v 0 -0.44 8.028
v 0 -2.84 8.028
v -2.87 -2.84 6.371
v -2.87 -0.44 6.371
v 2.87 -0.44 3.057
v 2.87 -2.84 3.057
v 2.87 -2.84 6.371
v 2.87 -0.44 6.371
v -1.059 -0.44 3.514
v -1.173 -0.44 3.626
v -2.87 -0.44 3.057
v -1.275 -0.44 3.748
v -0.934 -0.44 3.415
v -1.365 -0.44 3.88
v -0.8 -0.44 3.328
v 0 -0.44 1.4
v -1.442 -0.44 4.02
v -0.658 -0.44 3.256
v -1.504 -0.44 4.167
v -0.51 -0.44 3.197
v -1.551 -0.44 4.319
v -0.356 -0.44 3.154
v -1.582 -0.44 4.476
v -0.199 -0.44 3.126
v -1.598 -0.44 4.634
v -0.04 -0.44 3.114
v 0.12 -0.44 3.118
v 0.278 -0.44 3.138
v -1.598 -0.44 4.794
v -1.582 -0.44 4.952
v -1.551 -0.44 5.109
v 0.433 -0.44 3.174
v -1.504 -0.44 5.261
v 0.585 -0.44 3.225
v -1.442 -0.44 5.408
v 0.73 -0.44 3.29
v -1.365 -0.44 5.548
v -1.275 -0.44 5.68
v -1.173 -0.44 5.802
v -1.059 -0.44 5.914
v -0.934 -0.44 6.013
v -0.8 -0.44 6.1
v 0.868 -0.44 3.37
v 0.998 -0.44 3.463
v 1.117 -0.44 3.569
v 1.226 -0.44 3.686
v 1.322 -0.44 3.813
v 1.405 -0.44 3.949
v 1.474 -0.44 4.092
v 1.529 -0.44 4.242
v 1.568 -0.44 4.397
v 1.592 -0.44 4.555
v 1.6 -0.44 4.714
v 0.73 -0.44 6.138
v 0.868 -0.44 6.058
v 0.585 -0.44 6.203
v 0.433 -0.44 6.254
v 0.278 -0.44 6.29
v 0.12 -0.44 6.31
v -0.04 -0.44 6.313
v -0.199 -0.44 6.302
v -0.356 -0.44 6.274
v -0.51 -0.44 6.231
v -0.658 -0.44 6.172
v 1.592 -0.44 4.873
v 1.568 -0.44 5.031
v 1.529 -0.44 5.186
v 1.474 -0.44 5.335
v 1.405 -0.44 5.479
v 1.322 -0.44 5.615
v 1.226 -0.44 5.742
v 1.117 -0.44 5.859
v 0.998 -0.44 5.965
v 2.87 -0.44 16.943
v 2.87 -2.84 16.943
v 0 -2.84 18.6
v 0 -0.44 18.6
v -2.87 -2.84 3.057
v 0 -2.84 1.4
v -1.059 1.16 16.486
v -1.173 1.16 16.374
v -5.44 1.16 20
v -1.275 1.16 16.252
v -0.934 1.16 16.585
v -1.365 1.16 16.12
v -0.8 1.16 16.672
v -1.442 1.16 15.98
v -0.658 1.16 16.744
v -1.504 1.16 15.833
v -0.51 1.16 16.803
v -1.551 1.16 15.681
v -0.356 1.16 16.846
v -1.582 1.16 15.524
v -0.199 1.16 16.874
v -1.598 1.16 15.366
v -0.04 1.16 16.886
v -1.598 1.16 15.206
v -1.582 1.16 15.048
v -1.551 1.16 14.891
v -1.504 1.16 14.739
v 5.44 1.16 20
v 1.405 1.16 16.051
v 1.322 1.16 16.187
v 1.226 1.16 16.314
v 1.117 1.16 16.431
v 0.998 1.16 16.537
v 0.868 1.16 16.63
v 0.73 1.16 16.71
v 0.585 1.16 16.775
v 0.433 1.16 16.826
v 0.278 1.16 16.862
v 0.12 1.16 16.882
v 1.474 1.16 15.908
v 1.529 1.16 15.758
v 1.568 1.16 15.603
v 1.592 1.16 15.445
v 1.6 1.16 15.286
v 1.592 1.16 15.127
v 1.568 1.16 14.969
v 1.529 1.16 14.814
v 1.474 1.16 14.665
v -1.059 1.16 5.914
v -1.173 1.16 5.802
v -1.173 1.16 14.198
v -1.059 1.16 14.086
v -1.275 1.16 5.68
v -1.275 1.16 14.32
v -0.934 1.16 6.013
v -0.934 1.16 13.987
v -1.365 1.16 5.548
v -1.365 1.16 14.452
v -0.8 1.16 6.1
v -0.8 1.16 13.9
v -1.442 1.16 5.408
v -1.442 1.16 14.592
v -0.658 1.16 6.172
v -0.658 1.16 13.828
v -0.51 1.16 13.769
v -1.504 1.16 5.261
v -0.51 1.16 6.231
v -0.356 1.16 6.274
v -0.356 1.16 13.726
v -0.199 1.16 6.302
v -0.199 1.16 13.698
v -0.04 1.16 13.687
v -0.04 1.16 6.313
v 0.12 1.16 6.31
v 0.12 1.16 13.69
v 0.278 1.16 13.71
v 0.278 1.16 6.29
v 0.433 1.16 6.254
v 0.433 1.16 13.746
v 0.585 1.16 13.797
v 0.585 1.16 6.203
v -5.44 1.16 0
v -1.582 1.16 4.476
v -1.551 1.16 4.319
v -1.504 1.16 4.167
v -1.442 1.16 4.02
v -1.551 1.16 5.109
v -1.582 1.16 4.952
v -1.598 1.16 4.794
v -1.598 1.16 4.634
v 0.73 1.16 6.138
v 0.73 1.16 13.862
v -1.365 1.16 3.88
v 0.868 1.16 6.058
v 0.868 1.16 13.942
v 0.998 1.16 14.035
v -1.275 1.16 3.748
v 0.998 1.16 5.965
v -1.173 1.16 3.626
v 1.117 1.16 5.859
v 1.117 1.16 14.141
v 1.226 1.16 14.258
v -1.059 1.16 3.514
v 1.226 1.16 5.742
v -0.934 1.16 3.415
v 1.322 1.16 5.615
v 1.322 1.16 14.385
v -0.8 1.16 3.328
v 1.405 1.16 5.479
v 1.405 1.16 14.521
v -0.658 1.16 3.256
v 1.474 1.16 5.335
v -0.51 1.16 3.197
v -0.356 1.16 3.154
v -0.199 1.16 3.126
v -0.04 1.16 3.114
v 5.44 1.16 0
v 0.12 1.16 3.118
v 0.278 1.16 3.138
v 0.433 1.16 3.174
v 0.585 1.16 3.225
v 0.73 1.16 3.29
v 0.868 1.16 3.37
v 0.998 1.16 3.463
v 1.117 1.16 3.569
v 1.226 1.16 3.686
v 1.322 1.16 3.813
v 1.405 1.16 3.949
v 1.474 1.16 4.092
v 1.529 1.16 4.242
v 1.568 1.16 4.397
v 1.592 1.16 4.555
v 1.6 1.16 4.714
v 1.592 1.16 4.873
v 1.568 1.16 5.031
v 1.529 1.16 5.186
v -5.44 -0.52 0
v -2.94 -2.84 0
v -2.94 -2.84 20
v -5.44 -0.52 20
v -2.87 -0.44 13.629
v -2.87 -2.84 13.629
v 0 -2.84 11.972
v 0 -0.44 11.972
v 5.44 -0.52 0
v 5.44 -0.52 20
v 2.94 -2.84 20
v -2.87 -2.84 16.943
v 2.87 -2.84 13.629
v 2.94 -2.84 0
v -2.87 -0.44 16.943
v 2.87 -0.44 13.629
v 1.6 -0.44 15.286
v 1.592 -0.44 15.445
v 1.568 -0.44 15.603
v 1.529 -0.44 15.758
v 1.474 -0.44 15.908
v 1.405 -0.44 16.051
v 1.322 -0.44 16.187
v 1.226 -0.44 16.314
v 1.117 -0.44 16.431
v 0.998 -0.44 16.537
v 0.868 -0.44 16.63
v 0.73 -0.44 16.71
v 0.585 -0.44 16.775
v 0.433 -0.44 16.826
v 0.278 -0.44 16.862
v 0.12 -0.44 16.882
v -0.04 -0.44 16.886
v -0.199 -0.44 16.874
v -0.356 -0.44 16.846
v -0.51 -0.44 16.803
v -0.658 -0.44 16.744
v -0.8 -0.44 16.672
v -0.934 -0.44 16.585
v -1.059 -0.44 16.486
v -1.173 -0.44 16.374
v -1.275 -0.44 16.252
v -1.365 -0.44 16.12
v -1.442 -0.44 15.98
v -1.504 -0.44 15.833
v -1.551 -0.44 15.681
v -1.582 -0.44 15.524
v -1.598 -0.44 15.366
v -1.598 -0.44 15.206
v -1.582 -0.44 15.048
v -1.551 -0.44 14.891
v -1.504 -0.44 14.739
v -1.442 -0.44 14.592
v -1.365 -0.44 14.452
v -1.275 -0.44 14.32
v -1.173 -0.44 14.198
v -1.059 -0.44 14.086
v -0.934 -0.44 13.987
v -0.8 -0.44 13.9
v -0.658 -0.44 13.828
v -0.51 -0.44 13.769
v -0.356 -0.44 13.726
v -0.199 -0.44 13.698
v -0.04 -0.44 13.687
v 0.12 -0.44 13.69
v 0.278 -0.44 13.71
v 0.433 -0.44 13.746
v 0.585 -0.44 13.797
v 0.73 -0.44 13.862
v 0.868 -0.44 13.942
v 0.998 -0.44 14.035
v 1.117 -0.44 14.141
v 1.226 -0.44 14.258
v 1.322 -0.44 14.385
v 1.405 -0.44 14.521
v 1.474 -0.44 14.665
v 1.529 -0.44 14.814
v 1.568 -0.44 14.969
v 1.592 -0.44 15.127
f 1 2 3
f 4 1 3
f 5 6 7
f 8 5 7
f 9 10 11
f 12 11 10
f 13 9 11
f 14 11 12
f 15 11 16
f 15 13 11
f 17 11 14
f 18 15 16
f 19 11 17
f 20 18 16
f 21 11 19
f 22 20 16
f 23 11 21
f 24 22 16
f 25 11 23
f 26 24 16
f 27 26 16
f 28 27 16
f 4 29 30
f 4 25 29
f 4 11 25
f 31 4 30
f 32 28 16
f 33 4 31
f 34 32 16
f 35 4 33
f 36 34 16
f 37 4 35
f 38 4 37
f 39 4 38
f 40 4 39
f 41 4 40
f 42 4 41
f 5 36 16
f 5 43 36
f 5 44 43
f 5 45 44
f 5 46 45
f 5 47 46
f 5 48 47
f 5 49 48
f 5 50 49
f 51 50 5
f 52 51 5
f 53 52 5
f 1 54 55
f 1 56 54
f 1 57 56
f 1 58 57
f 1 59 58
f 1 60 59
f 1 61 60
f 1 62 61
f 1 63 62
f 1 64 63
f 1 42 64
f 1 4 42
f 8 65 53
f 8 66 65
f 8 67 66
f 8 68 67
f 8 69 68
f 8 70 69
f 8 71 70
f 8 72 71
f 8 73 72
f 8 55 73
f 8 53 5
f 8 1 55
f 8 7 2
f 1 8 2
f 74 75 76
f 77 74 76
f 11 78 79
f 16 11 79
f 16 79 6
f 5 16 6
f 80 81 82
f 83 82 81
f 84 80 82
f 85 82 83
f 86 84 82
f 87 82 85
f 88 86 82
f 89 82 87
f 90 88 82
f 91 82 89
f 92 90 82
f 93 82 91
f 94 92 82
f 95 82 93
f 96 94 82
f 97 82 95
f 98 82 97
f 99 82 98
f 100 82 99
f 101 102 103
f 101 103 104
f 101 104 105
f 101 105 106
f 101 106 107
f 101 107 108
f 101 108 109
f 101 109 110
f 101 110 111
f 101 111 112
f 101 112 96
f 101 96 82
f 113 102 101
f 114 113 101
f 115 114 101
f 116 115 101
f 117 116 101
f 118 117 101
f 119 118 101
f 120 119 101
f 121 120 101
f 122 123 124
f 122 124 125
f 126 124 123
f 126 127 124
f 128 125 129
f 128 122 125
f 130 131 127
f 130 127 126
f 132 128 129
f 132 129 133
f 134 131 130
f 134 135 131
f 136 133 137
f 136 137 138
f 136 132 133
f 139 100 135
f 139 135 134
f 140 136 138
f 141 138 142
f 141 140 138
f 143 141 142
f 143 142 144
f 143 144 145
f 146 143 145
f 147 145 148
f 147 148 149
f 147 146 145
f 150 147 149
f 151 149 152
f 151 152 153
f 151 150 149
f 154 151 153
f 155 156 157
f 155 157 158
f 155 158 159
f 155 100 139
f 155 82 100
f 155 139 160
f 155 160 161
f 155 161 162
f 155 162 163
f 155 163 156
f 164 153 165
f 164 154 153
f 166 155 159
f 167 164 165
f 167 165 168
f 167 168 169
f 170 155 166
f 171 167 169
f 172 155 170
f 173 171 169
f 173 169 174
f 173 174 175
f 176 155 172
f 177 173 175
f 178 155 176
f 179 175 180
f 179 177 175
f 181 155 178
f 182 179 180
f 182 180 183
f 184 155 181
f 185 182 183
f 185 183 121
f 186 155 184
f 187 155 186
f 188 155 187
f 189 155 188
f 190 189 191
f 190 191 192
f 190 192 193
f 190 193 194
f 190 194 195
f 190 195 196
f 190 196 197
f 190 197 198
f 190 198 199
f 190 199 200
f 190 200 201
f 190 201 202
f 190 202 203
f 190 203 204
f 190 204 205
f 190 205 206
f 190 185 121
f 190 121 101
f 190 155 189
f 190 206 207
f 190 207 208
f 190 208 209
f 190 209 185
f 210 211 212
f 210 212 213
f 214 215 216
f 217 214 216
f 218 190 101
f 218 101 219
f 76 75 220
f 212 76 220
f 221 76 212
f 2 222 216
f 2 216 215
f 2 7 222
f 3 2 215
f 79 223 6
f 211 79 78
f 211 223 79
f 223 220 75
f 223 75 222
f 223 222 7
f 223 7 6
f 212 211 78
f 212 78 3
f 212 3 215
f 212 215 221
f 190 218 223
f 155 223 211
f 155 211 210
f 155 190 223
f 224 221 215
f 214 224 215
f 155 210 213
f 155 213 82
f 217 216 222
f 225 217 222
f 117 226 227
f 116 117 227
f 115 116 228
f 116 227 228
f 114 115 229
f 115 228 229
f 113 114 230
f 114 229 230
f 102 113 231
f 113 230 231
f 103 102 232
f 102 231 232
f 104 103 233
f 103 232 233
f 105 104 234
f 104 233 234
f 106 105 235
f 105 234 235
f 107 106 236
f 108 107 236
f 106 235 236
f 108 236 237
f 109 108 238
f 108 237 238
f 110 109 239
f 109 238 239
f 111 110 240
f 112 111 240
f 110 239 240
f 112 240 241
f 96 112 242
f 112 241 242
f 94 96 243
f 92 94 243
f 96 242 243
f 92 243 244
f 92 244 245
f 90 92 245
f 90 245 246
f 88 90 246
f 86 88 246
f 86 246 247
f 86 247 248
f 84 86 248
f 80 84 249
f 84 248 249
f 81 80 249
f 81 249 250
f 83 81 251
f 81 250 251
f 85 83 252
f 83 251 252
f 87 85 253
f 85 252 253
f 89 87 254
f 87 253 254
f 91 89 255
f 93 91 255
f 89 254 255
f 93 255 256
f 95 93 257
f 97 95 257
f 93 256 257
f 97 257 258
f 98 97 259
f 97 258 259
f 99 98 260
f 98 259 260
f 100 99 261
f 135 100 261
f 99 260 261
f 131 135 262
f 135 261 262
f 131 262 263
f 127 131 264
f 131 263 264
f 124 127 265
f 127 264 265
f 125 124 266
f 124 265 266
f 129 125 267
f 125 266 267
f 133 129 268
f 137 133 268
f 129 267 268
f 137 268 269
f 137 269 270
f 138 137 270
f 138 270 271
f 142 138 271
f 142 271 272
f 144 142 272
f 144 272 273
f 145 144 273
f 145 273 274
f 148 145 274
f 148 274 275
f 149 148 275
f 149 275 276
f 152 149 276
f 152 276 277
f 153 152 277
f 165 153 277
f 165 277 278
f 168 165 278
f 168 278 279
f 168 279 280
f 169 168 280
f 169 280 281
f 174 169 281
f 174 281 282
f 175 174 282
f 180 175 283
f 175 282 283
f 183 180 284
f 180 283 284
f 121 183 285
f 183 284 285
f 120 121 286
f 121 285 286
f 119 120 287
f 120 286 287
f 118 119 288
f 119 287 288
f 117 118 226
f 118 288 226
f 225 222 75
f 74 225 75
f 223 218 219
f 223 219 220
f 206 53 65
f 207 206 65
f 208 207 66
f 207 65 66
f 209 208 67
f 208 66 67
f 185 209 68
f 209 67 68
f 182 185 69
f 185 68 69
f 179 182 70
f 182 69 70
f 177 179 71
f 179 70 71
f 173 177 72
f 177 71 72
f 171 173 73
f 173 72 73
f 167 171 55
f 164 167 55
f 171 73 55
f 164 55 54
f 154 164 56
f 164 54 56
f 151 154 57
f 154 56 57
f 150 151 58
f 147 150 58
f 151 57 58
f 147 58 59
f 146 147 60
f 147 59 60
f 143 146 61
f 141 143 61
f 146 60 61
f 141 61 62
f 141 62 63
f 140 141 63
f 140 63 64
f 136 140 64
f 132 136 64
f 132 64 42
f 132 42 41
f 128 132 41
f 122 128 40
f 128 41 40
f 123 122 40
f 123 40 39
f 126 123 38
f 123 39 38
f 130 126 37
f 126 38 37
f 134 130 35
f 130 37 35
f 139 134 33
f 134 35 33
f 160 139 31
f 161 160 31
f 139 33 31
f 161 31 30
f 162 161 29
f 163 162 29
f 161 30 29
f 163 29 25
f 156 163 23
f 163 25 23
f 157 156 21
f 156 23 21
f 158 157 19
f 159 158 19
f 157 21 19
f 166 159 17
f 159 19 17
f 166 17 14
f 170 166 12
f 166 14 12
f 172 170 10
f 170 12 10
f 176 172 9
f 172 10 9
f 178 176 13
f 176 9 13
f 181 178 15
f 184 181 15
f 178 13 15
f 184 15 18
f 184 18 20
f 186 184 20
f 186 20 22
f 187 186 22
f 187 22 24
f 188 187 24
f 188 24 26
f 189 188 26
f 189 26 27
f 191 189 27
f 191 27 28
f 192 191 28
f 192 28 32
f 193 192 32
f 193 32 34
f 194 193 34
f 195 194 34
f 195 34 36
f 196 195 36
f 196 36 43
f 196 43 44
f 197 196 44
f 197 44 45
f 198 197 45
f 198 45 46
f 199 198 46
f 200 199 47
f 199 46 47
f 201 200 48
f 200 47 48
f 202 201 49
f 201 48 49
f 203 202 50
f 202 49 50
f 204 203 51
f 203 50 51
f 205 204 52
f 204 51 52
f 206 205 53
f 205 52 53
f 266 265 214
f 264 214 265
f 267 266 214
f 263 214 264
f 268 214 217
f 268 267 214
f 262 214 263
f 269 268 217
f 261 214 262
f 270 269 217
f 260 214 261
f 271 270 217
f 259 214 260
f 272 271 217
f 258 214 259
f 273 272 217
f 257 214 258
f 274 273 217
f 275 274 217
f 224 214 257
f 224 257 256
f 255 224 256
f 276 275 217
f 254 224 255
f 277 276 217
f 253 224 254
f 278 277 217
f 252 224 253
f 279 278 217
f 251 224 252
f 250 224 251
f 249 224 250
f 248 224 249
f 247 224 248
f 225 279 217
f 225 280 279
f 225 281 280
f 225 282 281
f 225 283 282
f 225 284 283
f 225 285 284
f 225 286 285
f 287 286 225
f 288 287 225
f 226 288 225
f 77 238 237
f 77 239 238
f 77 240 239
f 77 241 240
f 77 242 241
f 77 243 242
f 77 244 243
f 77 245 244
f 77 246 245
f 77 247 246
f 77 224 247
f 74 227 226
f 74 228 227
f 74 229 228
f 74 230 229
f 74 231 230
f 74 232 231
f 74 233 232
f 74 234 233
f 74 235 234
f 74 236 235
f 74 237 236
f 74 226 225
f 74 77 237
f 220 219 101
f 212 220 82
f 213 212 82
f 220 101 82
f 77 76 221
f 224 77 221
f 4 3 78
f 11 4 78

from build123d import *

# Parameters (mm, degrees)
PAD_DEPTH       = 20
SKETCH001_W     = 5.88
SKETCH001_H     = 1.68
POCKET_DEPTH    = 20
POCKET001_DEPTH = 2.4
SKETCH003_R     = 1.6
POCKET002_DEPTH = 1.6


with BuildPart() as part:
    # Sketch → Pad (new body)
    with BuildSketch(Plane.XY):
        Polygon((2.94, -2.84), (-2.94, -2.84), (-5.44, -0.52), (-5.44, 1.16), (-2.94, 1.16), (-2.94, 2.84), (2.94, 2.84), (2.94, 1.16), (5.44, 1.16), (5.44, -0.52), align=None)
    extrude(amount=PAD_DEPTH)

    # Sketch001 (on Face11 of Pad) → Pocket (cut)
    with BuildSketch(Plane(origin=(0, 0, 0), x_dir=(1, 0, 0), z_dir=(0, 0, -1))):
        with Locations((0, -2)):
            Rectangle(SKETCH001_W, SKETCH001_H)
    extrude(amount=-POCKET_DEPTH, mode=Mode.SUBTRACT)

    # Sketch002 (on Face1 of Pocket) → Pocket001 (cut)
    with BuildSketch(Plane.XZ.offset(2.84)):
        Polygon((0, 18.6), (-2.87, 16.943005), (-2.87, 13.629014), (0, 11.972019), (2.87, 13.629014), (2.87, 16.943005), align=None)
        Polygon((2.87, 6.370986), (0, 8.027981), (-2.87, 6.370986), (-2.87, 3.056995), (0, 1.4), (2.87, 3.056995), align=None)
    extrude(amount=-POCKET001_DEPTH, mode=Mode.SUBTRACT)

    # Sketch003 (on Face24 of Pocket001) → Pocket002 (cut)
    with BuildSketch(Plane.XZ.offset(0.44)):
        with Locations((0, 15.286009)):
            Circle(SKETCH003_R)
        with Locations((0, 4.713991)):
            Circle(SKETCH003_R)
    extrude(amount=-POCKET002_DEPTH, mode=Mode.SUBTRACT)


solid = part.part
